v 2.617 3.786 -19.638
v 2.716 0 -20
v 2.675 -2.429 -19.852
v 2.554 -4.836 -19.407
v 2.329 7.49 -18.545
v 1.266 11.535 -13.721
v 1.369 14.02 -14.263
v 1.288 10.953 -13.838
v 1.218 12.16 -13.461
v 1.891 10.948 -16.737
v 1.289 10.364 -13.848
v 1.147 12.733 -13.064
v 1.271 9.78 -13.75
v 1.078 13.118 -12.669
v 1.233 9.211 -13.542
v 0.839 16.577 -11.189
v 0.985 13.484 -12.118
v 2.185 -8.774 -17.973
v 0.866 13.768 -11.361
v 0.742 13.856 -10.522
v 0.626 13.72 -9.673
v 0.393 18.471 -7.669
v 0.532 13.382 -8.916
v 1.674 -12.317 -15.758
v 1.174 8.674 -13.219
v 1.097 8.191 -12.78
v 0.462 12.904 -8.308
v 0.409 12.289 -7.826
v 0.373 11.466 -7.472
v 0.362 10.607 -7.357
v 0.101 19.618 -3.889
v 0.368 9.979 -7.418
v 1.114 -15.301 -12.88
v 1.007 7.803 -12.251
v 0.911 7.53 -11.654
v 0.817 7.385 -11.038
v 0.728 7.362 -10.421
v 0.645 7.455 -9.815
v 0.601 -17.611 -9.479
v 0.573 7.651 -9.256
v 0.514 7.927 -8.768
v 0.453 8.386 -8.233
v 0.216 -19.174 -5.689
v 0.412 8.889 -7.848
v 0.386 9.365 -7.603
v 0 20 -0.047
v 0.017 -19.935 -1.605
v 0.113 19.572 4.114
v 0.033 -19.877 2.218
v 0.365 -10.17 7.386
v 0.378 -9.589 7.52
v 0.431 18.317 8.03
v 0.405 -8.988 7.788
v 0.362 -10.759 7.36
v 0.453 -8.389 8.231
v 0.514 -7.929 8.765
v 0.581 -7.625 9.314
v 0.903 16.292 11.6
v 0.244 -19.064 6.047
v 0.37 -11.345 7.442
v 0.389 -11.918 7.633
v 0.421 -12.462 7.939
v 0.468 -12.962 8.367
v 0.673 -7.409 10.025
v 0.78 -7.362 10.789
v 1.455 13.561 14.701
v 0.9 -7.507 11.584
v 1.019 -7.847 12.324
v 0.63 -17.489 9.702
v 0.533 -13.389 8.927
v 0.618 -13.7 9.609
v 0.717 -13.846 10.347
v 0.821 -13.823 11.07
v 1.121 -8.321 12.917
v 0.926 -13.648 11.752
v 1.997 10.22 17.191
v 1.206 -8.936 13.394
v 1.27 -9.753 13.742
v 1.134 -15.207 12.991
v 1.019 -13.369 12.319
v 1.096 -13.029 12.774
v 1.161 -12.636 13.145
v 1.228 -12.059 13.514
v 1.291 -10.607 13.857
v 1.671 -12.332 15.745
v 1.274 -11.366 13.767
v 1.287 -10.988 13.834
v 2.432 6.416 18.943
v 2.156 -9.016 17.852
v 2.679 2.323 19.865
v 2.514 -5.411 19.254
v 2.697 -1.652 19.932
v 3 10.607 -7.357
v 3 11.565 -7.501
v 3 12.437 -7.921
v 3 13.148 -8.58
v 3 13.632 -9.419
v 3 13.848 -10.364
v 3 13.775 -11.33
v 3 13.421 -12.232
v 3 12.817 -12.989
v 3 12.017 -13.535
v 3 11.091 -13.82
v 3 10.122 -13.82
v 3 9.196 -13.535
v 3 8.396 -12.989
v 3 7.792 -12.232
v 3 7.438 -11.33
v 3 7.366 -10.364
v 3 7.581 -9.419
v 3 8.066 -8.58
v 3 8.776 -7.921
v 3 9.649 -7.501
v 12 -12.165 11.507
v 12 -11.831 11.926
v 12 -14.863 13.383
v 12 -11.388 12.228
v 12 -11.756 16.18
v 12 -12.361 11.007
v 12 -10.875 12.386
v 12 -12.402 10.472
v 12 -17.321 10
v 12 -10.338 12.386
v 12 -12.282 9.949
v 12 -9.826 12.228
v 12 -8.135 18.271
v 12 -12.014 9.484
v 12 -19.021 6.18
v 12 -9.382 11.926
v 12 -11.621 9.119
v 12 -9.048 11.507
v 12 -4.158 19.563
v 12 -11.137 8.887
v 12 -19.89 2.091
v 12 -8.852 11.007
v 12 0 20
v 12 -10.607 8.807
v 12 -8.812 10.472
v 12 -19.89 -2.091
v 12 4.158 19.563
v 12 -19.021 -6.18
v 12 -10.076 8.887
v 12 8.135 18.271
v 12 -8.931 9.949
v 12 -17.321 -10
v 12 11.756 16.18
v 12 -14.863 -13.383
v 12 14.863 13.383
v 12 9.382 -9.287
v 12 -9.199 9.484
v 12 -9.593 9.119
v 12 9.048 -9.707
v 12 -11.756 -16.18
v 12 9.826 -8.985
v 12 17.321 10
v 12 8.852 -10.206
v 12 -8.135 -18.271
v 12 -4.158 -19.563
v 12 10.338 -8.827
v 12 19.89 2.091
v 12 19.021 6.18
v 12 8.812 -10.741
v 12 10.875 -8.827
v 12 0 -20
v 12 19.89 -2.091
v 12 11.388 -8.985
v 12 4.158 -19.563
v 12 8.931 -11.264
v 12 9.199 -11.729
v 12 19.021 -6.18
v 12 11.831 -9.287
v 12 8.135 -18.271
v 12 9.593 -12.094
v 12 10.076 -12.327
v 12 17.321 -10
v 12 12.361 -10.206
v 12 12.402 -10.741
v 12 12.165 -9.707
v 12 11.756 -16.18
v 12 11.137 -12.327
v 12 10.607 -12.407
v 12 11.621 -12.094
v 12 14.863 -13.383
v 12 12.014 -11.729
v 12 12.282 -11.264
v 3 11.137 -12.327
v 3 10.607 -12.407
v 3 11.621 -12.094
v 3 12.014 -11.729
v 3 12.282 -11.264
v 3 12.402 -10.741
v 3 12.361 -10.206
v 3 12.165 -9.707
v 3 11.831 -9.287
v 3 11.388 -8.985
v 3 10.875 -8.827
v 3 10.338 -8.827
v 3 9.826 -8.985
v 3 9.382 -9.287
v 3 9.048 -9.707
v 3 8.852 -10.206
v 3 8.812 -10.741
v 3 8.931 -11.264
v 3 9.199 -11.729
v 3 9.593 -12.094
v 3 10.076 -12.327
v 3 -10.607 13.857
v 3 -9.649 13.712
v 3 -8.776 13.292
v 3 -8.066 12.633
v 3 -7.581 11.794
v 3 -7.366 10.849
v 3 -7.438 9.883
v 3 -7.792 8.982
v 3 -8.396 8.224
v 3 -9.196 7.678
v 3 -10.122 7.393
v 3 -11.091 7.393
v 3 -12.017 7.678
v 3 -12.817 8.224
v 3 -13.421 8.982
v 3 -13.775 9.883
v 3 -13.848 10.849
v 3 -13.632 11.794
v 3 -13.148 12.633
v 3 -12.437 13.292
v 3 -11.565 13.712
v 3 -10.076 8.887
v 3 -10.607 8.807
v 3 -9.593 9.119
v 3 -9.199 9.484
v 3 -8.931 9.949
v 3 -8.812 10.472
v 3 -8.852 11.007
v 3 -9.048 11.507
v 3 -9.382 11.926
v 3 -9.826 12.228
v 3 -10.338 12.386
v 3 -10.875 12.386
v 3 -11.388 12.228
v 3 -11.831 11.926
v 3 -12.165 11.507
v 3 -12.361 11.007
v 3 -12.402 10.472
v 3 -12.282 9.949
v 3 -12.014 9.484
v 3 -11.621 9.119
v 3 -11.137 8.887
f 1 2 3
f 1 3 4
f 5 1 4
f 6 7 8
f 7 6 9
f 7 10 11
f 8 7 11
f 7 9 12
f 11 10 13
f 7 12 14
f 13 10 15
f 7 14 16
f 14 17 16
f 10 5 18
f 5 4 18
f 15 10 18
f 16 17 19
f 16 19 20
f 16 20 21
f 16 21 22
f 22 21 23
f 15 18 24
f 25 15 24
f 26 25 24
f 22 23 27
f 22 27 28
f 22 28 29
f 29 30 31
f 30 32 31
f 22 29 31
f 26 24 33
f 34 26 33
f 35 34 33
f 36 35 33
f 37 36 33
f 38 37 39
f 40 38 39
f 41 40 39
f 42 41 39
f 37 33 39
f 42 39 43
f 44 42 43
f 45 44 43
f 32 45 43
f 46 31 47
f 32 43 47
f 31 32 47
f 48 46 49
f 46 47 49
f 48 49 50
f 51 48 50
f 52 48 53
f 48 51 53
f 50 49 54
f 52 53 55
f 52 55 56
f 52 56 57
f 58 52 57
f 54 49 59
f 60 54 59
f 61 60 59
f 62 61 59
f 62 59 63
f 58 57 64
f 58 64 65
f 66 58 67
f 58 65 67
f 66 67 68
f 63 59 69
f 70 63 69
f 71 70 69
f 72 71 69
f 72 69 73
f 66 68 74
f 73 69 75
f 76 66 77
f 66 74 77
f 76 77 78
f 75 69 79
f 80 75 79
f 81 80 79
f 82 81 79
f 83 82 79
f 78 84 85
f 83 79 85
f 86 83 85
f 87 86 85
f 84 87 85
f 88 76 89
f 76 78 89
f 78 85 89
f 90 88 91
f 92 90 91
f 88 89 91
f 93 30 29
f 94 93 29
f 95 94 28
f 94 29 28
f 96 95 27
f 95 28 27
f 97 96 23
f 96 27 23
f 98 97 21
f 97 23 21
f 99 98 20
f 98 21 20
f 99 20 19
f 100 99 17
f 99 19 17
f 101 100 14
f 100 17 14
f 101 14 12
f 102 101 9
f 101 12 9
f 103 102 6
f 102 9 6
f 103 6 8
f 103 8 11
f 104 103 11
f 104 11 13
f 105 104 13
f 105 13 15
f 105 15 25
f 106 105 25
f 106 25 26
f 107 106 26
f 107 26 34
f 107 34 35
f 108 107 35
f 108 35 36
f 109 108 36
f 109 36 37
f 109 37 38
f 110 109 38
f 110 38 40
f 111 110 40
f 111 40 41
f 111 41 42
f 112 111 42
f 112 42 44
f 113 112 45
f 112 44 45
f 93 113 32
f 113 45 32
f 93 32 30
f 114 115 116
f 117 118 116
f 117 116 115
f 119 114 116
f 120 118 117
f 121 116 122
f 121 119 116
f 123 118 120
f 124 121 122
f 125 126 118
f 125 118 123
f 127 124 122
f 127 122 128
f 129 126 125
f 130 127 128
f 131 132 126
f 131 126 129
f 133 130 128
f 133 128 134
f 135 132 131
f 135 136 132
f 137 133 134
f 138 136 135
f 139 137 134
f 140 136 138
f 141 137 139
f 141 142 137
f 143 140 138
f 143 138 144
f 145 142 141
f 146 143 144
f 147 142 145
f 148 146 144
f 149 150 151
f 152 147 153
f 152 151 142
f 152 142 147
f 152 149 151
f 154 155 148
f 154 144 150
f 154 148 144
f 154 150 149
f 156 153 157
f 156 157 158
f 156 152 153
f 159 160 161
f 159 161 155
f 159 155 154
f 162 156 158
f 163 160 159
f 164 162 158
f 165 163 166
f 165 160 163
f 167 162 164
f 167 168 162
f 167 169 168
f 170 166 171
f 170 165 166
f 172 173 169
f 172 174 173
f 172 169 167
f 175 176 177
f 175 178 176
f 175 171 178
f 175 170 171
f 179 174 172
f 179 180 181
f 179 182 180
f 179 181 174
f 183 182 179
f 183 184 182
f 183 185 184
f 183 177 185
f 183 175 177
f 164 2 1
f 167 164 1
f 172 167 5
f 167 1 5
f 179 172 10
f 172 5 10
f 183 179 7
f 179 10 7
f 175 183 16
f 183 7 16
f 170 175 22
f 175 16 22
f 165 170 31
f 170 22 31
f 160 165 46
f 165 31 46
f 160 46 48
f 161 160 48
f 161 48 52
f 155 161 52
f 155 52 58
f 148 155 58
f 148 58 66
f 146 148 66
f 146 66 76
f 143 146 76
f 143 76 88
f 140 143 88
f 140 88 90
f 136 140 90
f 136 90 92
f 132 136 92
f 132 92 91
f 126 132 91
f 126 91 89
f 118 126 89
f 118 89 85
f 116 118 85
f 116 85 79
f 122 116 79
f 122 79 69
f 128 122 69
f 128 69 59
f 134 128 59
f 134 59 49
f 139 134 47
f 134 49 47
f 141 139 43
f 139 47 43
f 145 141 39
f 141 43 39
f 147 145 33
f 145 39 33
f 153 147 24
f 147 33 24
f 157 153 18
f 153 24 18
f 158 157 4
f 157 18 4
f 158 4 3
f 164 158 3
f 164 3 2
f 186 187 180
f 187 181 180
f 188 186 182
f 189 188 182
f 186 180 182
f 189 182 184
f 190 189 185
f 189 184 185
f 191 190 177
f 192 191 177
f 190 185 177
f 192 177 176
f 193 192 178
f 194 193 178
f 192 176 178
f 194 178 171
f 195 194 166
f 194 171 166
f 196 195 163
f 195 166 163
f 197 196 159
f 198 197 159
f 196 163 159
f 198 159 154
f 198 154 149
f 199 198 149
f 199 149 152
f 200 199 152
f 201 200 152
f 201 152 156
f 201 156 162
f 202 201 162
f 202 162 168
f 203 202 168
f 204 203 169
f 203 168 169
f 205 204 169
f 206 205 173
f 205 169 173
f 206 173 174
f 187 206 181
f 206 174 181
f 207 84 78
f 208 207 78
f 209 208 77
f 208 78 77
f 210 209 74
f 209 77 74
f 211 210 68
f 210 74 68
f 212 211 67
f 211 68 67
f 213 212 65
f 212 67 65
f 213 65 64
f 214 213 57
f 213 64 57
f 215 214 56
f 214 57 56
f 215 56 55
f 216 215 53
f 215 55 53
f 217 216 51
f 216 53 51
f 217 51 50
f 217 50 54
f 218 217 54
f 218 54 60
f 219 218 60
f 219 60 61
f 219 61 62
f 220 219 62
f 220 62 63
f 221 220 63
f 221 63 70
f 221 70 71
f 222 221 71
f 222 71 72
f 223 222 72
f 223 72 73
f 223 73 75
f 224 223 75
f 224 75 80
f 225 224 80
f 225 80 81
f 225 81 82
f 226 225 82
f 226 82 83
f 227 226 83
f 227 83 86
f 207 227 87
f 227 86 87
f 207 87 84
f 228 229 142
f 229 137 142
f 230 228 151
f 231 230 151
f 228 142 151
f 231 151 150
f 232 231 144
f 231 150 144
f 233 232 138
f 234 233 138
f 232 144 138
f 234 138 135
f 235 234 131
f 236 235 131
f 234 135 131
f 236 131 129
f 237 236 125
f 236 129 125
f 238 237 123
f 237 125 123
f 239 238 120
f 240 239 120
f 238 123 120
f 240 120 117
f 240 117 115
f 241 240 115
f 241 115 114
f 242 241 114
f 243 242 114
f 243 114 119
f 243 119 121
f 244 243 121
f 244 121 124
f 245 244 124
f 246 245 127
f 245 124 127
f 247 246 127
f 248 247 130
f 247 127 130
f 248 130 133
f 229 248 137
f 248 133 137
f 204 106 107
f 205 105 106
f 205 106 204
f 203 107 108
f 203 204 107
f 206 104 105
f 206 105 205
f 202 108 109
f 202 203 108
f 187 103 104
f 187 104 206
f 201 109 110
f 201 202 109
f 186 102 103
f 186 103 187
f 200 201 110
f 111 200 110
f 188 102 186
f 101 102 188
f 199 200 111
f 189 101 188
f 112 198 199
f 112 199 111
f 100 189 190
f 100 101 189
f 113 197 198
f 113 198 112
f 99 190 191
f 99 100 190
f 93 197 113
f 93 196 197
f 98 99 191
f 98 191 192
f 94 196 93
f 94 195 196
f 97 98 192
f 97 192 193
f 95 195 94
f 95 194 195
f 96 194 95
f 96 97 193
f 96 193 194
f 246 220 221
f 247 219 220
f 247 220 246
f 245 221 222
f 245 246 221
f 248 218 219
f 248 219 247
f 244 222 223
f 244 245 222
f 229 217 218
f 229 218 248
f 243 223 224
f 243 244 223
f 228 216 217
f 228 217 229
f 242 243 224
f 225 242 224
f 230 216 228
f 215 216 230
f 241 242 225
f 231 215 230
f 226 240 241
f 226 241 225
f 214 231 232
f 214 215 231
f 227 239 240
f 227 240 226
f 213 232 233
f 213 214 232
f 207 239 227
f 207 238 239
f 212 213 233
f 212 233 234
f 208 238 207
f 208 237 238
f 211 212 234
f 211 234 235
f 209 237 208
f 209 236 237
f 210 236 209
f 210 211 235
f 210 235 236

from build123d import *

# Parameters (mm, degrees)
SKETCH1_R                              = 20
BLOCO_DEPTH                            = 12
FURO_DE_FIXA_O_PARAFUSO_M3_D           = 3.6
FURO_DE_FIXA_O_PARAFUSO_M3_CBORE_D     = 6.5
FURO_DE_FIXA_O_PARAFUSO_M3_CBORE_DEPTH = 3
CORTE_ARREDONDAMENTO_DEPTH             = 31.724582991
CORTE_ARREDONDAMENTO_DEPTH_BACK        = 31.724582991
SKETCH7_R                              = 100
SKETCH7_R_2                            = 75


with BuildPart() as part:
    # Sketch1 → Bloco (new body)
    with BuildSketch(Plane(origin=(0, 0, 0), x_dir=(0, 0, -1), z_dir=(1, 0, 0))):
        Circle(SKETCH1_R)
    extrude(amount=BLOCO_DEPTH)

    # Furo de Fixação - Parafuso M3 (through all)
    with Locations(Plane.ZY):
        with Locations((10.606601718, -10.606601718), (-10.606601718, 10.606601718)):
            CounterBoreHole(FURO_DE_FIXA_O_PARAFUSO_M3_D / 2, FURO_DE_FIXA_O_PARAFUSO_M3_CBORE_D / 2, FURO_DE_FIXA_O_PARAFUSO_M3_CBORE_DEPTH)

    # Sketch7 → Corte - Arredondamento (cut, two sides: drawn at the far end of the back side and taken through both)
    with BuildSketch(Plane(origin=(0, 0, 0), x_dir=(1, 0, 0), z_dir=(0, 1, 0)).offset(-CORTE_ARREDONDAMENTO_DEPTH_BACK)):
        with Locations((75, 0)):
            Circle(SKETCH7_R)
        with Locations((75, 0)):
            Circle(SKETCH7_R_2, mode=Mode.SUBTRACT)
    extrude(amount=CORTE_ARREDONDAMENTO_DEPTH + CORTE_ARREDONDAMENTO_DEPTH_BACK, mode=Mode.SUBTRACT)


solid = part.part
